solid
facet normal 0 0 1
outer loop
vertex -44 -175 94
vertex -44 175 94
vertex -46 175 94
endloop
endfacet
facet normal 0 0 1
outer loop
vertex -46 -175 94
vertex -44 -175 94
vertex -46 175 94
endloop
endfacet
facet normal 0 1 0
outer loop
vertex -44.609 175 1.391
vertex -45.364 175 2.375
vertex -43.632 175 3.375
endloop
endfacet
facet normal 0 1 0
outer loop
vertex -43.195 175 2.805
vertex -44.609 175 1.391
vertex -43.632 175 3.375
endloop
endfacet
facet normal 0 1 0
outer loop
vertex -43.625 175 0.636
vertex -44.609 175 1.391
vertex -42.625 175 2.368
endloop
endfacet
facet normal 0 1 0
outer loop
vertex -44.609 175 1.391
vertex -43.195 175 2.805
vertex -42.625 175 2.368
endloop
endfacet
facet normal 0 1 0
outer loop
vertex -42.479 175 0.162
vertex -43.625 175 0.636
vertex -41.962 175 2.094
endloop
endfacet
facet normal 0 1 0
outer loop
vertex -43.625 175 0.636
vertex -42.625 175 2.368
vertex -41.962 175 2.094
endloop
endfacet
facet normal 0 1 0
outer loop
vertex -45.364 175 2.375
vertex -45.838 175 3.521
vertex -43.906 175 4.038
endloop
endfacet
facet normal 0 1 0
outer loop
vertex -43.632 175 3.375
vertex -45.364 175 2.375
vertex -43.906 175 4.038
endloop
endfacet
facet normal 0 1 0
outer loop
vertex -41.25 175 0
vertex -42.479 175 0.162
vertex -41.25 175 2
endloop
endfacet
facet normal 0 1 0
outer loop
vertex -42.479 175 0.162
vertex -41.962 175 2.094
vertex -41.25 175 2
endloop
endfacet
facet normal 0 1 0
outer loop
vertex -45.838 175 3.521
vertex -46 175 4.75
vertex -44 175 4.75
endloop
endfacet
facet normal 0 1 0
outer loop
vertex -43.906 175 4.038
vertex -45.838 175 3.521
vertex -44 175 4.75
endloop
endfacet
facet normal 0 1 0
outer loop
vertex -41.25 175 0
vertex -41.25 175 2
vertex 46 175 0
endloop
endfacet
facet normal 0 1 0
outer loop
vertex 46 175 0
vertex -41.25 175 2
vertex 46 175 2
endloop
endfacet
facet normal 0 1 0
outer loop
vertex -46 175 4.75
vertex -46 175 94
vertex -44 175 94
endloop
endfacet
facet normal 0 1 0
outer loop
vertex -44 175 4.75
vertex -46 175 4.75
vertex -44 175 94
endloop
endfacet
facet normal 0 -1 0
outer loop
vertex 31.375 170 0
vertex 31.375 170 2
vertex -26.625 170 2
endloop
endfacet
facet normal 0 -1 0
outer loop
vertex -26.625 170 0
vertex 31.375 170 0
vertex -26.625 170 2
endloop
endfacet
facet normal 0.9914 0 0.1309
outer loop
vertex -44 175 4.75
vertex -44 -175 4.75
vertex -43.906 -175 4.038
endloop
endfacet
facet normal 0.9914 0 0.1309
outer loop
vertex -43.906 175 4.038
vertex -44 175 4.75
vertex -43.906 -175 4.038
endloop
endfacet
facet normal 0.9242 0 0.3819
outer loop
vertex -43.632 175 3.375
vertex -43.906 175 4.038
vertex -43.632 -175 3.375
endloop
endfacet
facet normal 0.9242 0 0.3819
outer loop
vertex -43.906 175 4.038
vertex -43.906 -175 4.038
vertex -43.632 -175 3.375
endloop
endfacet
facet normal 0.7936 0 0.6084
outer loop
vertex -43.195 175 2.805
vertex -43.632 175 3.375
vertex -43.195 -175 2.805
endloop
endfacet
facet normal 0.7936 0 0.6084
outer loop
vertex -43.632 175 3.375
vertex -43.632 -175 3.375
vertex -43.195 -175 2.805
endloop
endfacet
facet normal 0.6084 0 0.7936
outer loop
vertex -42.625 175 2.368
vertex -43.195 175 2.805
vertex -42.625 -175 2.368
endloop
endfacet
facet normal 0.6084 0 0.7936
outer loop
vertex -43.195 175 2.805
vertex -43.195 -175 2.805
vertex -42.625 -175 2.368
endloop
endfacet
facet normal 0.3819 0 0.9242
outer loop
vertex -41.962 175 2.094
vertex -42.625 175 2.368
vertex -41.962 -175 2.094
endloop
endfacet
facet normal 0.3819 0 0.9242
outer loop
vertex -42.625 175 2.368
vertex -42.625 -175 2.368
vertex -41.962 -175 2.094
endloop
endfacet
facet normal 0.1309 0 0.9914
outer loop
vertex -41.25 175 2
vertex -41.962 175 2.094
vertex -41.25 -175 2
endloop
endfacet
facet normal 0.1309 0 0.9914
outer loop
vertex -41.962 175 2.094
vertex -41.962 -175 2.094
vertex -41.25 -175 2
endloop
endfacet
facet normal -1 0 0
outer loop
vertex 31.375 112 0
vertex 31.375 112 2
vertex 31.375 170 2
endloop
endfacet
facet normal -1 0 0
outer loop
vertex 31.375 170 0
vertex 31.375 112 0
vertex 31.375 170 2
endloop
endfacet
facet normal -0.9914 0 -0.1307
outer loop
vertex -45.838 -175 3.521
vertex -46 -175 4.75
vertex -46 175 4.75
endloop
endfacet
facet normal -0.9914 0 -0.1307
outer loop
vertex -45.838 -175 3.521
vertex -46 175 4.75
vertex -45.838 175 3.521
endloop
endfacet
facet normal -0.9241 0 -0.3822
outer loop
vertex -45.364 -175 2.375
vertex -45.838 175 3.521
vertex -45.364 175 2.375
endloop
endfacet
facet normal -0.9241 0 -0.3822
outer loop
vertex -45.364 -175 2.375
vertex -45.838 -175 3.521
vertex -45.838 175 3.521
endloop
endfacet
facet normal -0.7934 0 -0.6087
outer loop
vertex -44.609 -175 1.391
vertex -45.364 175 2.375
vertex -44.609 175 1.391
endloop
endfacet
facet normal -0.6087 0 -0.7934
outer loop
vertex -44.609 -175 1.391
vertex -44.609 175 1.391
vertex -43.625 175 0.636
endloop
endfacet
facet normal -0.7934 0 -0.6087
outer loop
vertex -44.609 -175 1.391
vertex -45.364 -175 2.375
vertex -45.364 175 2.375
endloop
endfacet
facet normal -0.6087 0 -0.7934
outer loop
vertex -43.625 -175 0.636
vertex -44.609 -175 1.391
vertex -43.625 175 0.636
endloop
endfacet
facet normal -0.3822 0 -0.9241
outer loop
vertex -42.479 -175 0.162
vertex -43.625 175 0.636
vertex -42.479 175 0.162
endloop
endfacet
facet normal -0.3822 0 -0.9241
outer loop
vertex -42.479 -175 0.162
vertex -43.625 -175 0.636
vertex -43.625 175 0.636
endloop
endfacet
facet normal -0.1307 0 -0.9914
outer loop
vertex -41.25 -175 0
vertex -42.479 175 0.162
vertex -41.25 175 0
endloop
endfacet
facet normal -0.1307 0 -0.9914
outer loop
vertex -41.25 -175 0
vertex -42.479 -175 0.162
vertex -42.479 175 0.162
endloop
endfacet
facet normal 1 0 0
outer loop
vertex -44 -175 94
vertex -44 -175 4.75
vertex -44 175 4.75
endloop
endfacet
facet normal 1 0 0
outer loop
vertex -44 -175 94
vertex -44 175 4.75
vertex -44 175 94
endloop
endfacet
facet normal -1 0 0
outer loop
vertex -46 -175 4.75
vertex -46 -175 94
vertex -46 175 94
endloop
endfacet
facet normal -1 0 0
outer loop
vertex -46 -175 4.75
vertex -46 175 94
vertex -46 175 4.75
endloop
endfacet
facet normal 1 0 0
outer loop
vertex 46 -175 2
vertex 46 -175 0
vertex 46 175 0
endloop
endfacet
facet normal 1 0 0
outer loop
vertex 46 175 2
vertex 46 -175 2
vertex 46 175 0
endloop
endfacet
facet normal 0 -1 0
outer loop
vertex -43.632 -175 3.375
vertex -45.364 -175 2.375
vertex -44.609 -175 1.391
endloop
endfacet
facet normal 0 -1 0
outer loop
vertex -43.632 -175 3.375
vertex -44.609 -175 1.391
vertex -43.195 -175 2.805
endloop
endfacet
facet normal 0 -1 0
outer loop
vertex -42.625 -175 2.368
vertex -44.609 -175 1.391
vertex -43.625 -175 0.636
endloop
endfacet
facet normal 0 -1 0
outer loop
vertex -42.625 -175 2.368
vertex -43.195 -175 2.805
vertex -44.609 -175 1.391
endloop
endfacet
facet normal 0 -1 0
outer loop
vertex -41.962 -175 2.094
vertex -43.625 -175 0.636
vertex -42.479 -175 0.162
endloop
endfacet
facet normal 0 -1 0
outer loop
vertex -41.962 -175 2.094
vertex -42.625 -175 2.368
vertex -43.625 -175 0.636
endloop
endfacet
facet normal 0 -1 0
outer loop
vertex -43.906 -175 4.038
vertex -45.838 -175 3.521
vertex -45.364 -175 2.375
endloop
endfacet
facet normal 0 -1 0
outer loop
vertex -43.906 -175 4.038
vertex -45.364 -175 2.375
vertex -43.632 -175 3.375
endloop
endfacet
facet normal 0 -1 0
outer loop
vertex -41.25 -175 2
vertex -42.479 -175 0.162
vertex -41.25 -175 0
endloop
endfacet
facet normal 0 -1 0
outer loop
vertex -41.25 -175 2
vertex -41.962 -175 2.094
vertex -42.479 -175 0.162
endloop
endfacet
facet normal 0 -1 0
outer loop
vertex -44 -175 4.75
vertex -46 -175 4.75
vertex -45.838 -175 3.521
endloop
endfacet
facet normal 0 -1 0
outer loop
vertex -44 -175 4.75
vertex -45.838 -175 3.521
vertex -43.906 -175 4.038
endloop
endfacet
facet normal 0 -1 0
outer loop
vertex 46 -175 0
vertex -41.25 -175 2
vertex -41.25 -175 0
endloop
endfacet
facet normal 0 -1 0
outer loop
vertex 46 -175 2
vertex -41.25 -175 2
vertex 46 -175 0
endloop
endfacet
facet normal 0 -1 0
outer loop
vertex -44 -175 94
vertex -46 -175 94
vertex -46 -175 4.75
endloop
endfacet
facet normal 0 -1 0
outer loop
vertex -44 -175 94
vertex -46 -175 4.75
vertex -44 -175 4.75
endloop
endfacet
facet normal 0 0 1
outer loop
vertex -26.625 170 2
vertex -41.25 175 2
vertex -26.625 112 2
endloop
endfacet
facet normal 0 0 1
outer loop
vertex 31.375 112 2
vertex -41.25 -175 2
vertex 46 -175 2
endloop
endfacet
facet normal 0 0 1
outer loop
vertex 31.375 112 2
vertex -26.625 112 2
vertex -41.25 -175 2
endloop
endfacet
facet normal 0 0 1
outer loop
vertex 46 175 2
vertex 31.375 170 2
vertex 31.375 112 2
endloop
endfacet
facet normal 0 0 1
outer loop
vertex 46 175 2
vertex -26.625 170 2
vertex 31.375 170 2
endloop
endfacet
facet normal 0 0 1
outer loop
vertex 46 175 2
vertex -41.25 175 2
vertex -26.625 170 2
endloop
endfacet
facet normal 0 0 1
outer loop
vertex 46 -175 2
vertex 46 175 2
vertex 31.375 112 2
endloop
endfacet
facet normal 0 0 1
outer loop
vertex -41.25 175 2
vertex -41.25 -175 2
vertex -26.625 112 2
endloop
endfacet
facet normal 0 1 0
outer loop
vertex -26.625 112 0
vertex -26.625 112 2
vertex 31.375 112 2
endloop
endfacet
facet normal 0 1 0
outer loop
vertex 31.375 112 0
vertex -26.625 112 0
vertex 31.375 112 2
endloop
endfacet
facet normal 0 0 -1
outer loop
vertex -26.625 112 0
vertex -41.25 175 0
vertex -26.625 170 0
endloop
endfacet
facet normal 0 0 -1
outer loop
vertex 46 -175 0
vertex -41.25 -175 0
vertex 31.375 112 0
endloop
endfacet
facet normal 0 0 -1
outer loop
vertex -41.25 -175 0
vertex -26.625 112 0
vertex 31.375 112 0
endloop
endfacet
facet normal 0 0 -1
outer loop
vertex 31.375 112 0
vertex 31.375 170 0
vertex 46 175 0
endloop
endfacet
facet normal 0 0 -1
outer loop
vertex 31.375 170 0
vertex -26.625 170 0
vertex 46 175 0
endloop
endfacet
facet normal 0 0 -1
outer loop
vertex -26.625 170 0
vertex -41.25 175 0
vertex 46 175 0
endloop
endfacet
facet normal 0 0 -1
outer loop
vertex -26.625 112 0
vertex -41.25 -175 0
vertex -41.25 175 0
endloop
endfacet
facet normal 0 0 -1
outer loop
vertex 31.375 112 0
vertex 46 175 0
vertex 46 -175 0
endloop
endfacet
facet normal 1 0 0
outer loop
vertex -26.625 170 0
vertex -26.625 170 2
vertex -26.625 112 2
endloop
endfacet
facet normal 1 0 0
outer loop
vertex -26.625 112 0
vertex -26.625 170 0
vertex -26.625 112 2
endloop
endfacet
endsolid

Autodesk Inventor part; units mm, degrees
ref_plane "YZ Plane" through (0, 0, 0) normal (1, 0, 0) x (0, 1, 0)
ref_plane "XZ Plane" through (0, 0, 0) normal (0, 1, 0) x (-1, 0, 0)
ref_plane "XY Plane" through (0, 0, 0) normal (0, 0, 1) x (1, 0, 0)
sketch "Sketch1" plane through (0, 0, 0) normal (0, 0, 1) x (1, 0, 0)
  line L0 (-46, -175) -> (46, -175)
  line L1 (46, -175) -> (46, 175)
  line L2 (46, 175) -> (-46, 175)
  line L3 (-46, 175) -> (-46, -175)
  line L4 (-46, -175) -> (46, 175) construction
  line L5 (46, -175) -> (-46, 175) construction
  point P0 (0, 0)
  dimension "d154" = 92
  dimension "d155" = 350
extrude "Plate5" add sketch "Sketch1" along normal blind 2
sketch "Sketch7" plane through (-44, -175, 0) normal (-1, 0, 0) x (0, -1, 0)
  line L0 (-350, 0) -> (0, 0)
  line L1 (0, 0) -> (0, 94)
  line L2 (0, 94) -> (-350, 94)
  line L3 (-350, 94) -> (-350, 0)
edge flange "Flange3" height 94 angle 90 thickness 2 bend radius 2.75 thickness toward (-1, 0, 0) relief round relief width 2 relief depth 1 edges at (-46, 0, 2) wall of the first edge with corners at (-44, 175, 0) (-44, -175, 0) (-44, -175, 94) (-44, 175, 94)
bend "Bend3"
corner "Corner3"
sketch "Sketch8" plane through (0, 0, 2) normal (0, 0, 1) x (1, 0, 0)
  line L0 (46, 175) -> (46, -175) projected
  line L1 (-41.25, 175) -> (46, 175) projected
  line L2 (31.375, 170) -> (-26.625, 170)
  line L3 (-26.625, 170) -> (-26.625, 112)
  line L4 (-26.625, 112) -> (31.375, 112)
  line L5 (31.375, 112) -> (31.375, 170)
  line L6 (31.375, 170) -> (-26.625, 112) construction
  line L7 (-26.625, 170) -> (31.375, 112) construction
  point P0 (0, 0)
  point P1 (2.375, 141)
  point P2 (2.375, 175)
  dimension "d167" = 58
  dimension "d168" = 58
  dimension "d169" = 5
extrude "Cut1" cut sketch "Sketch8" against normal blind 2
properties part number "PNS 752 FDS 1200 FLANGE 2_1600" material "Stainless Steel"
